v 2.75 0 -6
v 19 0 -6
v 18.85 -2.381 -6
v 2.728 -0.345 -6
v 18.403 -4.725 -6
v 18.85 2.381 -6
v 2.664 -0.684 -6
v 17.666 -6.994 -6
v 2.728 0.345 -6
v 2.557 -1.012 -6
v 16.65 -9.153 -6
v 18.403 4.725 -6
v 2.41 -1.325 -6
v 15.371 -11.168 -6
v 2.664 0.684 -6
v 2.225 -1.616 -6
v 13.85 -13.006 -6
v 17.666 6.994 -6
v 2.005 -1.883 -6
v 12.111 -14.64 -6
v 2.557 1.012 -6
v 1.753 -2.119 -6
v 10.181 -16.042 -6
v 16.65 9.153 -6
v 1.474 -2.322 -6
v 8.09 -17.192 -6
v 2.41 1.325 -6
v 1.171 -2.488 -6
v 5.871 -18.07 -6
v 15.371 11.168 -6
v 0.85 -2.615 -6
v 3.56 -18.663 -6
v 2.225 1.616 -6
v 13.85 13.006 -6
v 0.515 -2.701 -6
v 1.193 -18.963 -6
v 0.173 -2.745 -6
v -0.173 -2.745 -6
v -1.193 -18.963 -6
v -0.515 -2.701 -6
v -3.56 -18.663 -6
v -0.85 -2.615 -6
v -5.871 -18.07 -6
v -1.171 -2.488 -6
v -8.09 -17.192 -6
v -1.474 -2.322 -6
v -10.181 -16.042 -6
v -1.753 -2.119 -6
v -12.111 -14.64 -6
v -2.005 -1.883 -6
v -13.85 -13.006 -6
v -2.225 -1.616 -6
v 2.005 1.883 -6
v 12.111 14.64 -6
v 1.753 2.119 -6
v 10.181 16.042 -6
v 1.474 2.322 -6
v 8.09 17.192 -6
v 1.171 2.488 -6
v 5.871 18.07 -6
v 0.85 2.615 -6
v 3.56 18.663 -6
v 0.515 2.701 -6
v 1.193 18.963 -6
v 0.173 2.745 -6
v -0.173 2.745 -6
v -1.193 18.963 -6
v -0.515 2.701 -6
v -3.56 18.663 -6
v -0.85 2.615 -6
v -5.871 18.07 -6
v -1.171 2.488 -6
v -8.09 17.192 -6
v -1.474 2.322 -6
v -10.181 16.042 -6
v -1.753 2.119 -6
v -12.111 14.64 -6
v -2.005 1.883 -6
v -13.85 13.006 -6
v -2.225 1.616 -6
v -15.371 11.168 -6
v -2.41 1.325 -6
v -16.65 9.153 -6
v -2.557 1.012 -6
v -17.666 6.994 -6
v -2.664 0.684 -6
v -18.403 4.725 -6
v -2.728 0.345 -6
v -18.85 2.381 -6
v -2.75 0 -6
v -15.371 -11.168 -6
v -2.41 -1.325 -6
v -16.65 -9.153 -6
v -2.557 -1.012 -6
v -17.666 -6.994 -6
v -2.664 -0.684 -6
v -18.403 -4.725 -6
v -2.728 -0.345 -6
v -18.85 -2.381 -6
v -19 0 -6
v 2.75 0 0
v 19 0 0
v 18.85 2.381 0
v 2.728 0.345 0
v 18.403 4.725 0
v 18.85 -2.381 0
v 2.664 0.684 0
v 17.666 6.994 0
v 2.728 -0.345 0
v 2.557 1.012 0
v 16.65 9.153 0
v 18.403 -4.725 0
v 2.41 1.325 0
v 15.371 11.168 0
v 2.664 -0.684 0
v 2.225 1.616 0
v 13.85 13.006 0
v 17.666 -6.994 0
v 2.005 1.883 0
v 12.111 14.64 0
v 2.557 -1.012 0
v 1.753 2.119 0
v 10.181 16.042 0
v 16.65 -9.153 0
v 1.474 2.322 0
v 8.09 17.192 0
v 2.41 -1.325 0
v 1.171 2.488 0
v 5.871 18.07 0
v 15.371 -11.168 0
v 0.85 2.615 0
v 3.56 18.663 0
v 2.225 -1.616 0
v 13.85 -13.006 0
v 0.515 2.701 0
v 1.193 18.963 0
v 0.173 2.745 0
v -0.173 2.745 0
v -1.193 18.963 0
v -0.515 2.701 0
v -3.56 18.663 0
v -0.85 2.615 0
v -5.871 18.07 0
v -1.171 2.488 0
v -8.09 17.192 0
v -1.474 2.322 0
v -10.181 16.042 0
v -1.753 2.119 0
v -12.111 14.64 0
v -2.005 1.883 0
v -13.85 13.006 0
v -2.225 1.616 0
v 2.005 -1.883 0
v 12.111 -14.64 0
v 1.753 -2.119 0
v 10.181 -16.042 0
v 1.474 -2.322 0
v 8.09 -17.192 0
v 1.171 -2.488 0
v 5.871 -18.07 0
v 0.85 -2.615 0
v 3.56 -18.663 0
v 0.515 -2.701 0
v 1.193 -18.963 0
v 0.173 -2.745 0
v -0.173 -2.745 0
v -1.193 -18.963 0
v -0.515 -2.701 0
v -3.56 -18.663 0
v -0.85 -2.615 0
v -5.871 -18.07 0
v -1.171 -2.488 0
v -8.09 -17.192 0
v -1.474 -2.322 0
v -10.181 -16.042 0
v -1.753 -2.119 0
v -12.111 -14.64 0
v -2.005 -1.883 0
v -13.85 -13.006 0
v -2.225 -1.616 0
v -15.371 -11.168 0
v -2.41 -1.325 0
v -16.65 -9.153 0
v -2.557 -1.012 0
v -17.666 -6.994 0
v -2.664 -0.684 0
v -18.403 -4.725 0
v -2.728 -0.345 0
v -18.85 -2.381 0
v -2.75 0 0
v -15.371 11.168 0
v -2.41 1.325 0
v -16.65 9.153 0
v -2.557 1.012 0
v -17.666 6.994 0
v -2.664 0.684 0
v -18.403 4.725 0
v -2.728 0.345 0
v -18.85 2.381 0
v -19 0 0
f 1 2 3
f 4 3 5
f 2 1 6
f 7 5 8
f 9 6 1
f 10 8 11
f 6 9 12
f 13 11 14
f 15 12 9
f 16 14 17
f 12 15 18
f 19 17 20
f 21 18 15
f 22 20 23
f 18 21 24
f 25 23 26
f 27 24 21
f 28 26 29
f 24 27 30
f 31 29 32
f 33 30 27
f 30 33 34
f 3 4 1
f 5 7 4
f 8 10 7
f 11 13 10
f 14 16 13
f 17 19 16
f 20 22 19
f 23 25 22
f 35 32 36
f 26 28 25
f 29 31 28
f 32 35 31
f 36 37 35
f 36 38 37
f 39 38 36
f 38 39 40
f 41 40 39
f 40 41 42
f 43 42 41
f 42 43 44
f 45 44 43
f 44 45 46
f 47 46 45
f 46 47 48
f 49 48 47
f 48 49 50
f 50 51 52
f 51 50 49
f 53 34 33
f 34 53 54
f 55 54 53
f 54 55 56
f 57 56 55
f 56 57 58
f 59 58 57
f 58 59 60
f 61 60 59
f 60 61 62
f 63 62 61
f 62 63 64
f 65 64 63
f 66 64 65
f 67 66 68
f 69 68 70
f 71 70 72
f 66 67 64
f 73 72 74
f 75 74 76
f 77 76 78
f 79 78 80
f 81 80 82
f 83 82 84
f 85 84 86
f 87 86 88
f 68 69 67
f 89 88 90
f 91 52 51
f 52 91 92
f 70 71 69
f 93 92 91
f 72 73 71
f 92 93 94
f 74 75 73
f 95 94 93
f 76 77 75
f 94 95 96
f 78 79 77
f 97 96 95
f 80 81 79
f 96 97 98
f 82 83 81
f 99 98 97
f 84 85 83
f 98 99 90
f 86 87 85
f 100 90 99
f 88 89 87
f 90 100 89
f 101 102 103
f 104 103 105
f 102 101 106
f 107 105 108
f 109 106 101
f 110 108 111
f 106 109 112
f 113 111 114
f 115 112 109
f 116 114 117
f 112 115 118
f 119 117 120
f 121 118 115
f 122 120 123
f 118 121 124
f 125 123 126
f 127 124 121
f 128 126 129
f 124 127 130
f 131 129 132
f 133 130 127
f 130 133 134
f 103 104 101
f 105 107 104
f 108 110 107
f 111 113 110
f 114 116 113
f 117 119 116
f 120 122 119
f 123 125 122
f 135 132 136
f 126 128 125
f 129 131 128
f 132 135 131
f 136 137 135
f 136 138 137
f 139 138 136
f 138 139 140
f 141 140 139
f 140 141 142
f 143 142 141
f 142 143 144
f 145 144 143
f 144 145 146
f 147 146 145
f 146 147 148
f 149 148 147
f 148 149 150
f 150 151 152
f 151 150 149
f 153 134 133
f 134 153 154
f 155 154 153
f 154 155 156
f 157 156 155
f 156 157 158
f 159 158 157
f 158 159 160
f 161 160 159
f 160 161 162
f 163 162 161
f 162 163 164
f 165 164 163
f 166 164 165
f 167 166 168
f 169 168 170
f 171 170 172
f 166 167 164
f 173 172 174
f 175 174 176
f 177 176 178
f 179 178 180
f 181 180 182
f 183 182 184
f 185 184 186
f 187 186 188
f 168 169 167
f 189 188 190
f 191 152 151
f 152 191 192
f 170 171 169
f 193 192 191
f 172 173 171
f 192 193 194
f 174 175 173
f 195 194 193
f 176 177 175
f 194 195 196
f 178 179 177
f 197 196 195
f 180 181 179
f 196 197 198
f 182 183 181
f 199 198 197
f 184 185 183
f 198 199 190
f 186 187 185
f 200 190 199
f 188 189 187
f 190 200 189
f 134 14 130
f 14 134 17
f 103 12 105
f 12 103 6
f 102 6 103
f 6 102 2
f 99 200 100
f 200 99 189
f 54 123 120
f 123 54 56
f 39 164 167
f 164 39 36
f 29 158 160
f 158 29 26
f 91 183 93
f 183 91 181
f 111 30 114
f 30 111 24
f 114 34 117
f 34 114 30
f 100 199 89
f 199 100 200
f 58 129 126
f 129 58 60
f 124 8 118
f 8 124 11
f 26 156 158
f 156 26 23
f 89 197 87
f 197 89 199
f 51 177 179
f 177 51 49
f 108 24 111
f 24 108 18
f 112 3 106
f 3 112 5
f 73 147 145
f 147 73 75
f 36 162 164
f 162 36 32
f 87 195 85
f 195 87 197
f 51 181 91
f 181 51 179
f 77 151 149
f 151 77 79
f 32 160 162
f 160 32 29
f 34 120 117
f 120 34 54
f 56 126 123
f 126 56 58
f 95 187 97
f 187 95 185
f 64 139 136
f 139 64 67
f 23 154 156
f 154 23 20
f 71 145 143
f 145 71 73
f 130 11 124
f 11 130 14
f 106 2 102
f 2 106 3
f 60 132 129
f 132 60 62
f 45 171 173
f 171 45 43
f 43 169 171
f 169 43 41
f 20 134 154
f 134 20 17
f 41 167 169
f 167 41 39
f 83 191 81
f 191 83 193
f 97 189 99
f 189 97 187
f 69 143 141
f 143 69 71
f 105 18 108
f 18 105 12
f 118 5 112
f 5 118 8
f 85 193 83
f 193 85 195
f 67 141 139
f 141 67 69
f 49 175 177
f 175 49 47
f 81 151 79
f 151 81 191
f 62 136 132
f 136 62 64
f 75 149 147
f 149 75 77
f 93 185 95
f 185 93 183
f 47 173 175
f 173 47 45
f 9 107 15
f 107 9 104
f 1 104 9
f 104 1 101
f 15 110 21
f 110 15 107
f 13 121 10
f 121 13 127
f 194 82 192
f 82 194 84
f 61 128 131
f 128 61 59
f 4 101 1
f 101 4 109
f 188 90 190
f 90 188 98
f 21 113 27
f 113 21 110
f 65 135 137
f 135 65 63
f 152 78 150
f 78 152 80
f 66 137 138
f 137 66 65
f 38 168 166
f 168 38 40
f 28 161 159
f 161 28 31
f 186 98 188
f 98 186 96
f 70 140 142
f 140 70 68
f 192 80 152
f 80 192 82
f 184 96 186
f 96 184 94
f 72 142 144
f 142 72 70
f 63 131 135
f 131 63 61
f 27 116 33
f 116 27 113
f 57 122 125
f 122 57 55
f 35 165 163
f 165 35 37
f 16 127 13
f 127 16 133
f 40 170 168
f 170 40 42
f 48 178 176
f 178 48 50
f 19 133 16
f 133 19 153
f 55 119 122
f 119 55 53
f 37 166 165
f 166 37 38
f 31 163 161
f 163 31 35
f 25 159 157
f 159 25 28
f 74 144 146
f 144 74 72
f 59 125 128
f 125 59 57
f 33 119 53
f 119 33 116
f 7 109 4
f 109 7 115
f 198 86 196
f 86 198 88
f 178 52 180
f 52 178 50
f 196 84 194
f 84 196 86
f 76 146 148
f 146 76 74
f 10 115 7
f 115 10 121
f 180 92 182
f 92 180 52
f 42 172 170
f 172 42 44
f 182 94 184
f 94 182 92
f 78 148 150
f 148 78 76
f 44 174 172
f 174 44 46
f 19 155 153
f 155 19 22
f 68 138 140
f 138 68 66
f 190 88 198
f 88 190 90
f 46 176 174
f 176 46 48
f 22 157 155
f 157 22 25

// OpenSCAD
$fn = 50;


difference() {
	union() {
		translate(v = [0, 0, -6.0000000000]) {
			cylinder(h = 6, r = 10.0000000000);
		}
		translate(v = [0, 0, -6.0000000000]) {
			cylinder(h = 6, r = 19.0000000000);
		}
	}
	union() {
		#translate(v = [0, 0, -6]) {
			cylinder(h = 6, r = 2.7500000000);
		}
	}
}
